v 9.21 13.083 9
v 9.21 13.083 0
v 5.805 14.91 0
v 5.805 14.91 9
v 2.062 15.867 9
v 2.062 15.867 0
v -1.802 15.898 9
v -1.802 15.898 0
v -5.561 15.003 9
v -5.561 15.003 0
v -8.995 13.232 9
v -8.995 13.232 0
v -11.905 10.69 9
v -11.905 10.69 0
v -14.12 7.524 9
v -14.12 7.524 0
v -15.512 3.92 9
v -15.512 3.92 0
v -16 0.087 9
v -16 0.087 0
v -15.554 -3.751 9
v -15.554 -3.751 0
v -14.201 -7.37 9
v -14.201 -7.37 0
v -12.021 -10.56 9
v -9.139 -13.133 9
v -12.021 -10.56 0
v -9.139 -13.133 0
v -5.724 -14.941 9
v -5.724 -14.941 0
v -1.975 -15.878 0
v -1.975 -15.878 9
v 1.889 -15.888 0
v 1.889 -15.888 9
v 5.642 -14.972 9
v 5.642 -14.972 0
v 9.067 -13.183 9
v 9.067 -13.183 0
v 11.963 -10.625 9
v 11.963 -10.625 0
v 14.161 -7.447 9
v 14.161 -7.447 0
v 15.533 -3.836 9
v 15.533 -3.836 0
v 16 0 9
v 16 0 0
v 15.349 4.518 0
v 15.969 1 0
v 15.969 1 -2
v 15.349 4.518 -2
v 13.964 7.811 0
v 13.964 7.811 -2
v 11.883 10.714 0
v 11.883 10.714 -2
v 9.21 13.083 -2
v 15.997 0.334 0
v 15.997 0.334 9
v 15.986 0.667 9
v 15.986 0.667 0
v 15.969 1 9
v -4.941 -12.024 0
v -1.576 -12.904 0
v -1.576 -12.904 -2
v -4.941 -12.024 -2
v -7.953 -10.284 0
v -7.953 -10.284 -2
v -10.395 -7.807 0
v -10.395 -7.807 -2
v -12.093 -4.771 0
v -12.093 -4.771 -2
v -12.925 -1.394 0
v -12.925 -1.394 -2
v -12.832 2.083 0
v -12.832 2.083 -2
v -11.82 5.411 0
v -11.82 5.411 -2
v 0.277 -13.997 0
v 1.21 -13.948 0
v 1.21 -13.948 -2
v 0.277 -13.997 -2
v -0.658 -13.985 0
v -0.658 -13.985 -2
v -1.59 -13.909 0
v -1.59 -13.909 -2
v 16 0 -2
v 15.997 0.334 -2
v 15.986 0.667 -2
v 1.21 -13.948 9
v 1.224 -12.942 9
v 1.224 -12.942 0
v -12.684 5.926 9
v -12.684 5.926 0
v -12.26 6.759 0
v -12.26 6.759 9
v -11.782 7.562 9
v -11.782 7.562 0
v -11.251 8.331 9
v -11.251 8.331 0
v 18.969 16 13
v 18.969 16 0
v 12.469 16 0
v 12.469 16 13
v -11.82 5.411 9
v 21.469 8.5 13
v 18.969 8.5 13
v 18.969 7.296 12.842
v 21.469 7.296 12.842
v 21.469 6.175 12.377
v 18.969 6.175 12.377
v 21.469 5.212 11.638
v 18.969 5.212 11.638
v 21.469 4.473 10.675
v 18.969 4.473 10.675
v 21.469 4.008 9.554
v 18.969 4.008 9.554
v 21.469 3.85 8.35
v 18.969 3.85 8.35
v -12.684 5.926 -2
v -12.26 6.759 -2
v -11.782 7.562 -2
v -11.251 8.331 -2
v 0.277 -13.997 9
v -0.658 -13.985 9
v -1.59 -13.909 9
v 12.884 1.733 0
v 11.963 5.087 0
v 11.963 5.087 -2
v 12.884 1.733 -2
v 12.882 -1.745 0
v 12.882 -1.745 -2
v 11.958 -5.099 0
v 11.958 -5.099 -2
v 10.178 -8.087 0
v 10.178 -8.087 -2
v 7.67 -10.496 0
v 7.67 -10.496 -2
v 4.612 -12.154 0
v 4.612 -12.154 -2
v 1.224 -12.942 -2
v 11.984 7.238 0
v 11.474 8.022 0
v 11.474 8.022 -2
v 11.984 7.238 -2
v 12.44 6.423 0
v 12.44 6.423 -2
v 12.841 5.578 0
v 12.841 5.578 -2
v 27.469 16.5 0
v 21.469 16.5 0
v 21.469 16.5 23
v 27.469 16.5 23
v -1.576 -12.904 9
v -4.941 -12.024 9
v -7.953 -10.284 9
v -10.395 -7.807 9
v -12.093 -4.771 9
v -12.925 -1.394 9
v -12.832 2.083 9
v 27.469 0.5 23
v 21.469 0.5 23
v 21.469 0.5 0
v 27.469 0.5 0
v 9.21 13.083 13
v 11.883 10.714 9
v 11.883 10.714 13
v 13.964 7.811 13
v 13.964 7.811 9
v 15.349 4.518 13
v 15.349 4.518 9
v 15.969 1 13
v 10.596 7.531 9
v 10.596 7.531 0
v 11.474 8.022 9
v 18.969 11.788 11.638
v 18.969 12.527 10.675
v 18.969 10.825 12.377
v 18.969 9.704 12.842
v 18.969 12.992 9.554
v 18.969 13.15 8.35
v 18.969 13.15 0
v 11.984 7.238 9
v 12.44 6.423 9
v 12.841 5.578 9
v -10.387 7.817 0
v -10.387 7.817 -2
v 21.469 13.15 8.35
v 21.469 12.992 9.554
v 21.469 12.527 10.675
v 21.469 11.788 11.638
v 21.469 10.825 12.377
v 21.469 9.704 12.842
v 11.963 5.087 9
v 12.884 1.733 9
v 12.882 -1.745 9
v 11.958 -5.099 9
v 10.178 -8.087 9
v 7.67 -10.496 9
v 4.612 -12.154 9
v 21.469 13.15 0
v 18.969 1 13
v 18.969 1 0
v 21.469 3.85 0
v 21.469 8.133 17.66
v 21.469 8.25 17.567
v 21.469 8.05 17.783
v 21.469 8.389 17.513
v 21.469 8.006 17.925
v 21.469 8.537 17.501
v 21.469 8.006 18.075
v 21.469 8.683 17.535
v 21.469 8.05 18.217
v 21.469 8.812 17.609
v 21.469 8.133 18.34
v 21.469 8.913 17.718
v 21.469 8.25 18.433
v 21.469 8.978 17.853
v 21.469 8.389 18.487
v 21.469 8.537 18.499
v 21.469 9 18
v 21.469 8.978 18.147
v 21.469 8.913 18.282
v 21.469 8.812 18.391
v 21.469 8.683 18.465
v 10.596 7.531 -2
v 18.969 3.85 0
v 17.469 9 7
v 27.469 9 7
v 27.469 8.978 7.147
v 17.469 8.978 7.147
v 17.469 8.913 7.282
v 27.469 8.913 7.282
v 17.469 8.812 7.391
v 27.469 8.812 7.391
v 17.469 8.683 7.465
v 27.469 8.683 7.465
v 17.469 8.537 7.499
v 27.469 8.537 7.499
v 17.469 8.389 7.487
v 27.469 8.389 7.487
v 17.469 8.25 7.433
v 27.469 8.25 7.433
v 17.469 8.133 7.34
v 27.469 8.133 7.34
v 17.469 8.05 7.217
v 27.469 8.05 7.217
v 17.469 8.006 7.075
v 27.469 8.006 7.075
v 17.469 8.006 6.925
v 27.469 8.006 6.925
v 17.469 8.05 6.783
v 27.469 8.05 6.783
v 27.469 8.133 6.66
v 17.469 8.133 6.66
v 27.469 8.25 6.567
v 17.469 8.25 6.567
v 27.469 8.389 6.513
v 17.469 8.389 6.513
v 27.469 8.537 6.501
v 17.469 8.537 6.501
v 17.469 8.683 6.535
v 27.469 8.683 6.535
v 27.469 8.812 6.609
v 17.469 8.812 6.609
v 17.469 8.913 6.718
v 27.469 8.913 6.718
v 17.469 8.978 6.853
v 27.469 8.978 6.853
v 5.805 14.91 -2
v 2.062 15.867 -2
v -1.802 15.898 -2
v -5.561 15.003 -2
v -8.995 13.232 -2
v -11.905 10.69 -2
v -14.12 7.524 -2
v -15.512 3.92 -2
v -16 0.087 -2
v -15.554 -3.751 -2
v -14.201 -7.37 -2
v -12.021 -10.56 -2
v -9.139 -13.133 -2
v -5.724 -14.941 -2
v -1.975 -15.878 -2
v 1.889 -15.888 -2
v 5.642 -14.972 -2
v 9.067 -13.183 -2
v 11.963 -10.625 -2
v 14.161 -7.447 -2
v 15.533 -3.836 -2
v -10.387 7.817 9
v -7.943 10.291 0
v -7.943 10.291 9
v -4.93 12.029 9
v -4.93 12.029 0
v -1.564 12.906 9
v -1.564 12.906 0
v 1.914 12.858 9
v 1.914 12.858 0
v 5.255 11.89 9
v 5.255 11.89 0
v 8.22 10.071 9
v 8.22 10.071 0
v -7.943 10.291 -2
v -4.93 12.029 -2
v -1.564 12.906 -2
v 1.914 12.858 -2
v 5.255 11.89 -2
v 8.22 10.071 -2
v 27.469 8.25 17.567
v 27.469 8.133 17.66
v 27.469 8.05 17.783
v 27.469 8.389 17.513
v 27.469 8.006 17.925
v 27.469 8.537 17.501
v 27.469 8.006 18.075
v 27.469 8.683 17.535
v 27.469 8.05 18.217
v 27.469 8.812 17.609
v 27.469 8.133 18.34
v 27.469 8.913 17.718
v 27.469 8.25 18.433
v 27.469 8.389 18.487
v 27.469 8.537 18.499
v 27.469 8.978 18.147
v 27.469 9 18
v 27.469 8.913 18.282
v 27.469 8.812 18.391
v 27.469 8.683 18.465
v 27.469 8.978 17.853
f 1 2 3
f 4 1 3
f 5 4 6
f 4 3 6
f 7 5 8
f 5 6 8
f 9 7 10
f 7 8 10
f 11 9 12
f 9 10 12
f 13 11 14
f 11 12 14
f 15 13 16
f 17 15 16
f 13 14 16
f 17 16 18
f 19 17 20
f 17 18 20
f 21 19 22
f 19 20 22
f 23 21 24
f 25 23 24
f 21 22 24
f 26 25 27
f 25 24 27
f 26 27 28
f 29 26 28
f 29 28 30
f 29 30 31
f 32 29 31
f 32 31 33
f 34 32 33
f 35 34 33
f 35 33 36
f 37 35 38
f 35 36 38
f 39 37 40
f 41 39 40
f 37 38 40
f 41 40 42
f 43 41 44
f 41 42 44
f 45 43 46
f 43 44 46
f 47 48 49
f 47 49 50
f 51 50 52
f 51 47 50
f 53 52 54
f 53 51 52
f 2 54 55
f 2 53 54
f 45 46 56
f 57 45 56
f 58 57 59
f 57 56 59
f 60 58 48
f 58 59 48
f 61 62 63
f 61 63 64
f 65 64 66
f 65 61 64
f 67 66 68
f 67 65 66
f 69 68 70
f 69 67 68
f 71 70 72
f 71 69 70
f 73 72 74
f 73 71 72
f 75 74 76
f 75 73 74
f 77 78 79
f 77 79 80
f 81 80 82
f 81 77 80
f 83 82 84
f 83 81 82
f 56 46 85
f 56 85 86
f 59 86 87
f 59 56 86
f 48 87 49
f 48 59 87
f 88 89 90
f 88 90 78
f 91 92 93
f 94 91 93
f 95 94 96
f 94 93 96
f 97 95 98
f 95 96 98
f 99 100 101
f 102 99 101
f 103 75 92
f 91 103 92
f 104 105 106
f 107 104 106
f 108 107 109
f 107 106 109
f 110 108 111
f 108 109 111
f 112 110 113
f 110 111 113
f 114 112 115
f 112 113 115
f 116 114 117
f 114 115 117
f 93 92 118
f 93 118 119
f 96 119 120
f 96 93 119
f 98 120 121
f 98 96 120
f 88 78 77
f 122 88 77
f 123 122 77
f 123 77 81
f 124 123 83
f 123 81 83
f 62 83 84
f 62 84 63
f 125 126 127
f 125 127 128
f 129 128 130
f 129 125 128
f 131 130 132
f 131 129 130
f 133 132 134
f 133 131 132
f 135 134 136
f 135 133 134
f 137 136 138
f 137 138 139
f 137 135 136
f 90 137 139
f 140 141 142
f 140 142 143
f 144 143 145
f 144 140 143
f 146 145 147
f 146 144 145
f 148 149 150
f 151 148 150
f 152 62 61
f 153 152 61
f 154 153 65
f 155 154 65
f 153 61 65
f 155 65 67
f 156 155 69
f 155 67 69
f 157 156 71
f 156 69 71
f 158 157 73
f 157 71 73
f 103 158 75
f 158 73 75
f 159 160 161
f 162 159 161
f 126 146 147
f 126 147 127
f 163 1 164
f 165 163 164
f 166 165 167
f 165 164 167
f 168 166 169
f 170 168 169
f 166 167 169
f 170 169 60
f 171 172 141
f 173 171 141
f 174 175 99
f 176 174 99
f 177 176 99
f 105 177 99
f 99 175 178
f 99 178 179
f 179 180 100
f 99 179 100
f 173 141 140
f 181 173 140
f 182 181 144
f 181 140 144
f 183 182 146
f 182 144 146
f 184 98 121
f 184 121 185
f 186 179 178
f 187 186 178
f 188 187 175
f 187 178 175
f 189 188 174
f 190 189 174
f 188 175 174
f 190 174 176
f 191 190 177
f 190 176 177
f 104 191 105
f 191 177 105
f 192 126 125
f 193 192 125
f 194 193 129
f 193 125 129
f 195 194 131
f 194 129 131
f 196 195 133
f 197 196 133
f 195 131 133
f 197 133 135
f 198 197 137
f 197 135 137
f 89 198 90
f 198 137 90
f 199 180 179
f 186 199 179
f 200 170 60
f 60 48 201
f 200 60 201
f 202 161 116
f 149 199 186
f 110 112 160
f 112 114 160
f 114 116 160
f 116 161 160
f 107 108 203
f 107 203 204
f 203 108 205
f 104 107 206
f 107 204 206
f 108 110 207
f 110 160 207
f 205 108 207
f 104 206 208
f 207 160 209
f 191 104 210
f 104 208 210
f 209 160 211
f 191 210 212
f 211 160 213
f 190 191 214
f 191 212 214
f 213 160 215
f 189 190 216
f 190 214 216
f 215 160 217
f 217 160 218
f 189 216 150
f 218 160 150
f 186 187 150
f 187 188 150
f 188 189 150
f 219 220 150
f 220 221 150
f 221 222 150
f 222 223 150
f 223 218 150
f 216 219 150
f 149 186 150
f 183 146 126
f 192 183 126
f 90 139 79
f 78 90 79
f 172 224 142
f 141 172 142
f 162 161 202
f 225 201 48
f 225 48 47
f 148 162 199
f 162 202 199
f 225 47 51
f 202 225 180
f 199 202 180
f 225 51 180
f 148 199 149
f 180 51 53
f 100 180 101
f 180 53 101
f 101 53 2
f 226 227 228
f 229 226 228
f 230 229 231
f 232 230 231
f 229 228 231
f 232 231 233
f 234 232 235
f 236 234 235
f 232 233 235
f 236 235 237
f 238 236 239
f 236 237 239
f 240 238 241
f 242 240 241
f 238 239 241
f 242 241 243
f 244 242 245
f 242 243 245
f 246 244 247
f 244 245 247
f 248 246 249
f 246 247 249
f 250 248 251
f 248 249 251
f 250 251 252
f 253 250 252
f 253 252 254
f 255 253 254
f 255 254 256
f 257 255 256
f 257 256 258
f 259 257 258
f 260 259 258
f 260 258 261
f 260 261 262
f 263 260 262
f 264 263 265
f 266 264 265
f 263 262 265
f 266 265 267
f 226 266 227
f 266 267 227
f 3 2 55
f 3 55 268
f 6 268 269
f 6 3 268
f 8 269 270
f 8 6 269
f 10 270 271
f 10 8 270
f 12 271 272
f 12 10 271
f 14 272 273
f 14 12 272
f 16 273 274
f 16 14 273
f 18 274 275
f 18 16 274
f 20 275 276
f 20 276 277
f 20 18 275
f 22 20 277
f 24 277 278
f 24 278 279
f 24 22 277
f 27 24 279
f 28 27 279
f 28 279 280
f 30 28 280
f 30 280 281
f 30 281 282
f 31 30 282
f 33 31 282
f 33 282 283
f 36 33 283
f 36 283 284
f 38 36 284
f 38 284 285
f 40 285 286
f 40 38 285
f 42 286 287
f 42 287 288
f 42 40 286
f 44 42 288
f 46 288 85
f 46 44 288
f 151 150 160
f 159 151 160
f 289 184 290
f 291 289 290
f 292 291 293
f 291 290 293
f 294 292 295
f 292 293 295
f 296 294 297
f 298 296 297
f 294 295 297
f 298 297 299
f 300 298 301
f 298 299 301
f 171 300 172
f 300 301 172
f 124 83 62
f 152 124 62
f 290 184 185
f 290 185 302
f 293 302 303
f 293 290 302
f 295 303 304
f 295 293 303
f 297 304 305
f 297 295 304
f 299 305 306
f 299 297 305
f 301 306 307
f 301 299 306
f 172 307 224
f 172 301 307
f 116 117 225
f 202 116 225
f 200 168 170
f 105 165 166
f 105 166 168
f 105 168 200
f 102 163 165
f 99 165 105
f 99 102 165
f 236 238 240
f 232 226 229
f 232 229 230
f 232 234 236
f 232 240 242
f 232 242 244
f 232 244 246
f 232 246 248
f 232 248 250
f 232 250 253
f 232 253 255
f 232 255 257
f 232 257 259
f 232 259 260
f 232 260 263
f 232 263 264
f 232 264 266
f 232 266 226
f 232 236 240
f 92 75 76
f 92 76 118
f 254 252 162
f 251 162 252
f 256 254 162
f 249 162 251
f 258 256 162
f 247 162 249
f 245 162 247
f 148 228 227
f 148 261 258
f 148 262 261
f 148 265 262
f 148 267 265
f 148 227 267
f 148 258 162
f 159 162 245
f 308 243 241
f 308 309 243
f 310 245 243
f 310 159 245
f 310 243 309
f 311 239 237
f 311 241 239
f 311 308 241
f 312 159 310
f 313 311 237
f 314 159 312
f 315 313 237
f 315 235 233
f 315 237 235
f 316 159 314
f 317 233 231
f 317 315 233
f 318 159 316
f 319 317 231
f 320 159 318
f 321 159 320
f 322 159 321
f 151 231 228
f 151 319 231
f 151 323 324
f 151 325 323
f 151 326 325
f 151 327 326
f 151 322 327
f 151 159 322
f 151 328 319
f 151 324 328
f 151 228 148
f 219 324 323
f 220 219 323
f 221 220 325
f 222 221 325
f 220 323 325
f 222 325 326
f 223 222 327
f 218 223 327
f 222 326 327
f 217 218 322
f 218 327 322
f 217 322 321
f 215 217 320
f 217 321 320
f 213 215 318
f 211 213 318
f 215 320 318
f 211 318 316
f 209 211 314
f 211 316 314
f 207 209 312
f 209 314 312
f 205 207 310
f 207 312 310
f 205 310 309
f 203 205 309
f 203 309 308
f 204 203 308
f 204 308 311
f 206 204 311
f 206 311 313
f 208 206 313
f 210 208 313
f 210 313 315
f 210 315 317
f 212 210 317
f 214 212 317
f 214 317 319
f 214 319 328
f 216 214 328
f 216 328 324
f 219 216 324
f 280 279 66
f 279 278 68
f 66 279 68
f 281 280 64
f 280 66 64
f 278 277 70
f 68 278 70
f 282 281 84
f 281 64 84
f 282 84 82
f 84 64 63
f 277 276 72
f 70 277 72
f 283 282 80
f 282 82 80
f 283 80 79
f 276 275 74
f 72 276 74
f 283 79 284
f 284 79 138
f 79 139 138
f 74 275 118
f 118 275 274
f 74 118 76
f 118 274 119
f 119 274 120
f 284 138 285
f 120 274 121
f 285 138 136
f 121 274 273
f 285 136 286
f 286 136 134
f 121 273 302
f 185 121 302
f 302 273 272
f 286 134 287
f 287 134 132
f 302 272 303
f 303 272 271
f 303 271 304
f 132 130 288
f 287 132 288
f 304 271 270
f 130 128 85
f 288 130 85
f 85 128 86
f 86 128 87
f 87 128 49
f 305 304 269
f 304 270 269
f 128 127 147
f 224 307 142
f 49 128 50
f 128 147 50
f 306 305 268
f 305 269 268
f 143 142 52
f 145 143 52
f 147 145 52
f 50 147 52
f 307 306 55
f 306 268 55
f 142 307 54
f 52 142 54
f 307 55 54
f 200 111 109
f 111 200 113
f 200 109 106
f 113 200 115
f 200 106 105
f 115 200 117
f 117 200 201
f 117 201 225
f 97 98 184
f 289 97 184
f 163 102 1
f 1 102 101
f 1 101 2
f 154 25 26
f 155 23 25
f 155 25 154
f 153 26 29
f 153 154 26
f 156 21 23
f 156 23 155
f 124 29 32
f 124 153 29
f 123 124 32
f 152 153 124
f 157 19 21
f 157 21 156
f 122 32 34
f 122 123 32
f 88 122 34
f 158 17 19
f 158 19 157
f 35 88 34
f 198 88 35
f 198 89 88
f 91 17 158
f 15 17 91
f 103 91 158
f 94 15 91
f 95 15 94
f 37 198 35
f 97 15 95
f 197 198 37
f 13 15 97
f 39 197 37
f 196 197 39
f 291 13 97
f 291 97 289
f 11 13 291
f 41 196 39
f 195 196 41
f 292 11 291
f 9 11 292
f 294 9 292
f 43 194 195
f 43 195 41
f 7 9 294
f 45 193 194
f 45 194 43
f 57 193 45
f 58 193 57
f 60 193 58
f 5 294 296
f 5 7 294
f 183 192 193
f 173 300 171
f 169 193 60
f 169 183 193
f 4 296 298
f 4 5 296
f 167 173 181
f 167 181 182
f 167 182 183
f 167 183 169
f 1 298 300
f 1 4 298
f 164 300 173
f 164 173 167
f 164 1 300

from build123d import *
from build123d import SkipClean  # not in build123d's __all__

# Parameters (mm, degrees)
F1_DEPTH = 9
F2_DEPTH = 13
F4_DEPTH = 2.5
F6_DEPTH = 6
F7_R     = 0.5
F8_DEPTH = 10
F9_DEPTH = 2


with BuildPart() as f1:
    # F0 (on Top) → F1 (new body)
    with BuildSketch(Plane.XY):
        with BuildLine():
            ThreePointArc((9.210061901, 13.0833772314), (-14.201425816, -7.3701767138), (16, 0))
            ThreePointArc((16, 0), (15.9921779437, 0.5002445588), (15.9687194227, 1))
            ThreePointArc((15.9687194227, 1), (13.964052369, 7.8105852172), (9.210061901, 13.0833772314))
        make_face()
        with BuildLine():
            Line((10.5963823009, 7.5310478775), (11.473873387, 8.0218594789))
            ThreePointArc((11.473873387, 8.0218594789), (12.2185458229, 6.834262065), (12.8407258, 5.5781503143))
            Line((12.8407258, 5.5781503143), (11.9632347139, 5.0873387129))
            ThreePointArc((11.9632347139, 5.0873387129), (11.1687805133, -6.6526943298), (1.2238876286, -12.9422601995))
            Line((1.2238876286, -12.9422601995), (1.2101974008, -13.9475955724))
            ThreePointArc((1.2101974008, -13.9475955724), (-0.190628347, -13.9987021125), (-1.5895430217, -13.909469903))
            Line((-1.5895430217, -13.909469903), (-1.5758527939, -12.9041345301))
            ThreePointArc((-1.5758527939, -12.9041345301), (-11.3457925498, -6.346100489), (-11.8202699295, 5.4112123221))
            Line((-11.8202699295, 5.4112123221), (-12.6840707878, 5.9257360935))
            ThreePointArc((-12.6840707878, 5.9257360935), (-12.0279174759, 7.1644400474), (-11.2511827783, 8.3313195887))
            Line((-11.2511827783, 8.3313195887), (-10.38738192, 7.8167958172))
            ThreePointArc((-10.38738192, 7.8167958172), (0.1770120365, 12.9987948187), (10.5963823009, 7.5310478775))
        make_face(mode=Mode.SUBTRACT)
        with BuildLine():
            ThreePointArc((9.210061901, 13.0833772314), (13.964052369, 7.8105852172), (15.9687194227, 1))
            Line((15.9687194227, 1), (18.9687194227, 1))
            Line((18.9687194227, 1), (18.9687194227, 16))
            Line((18.9687194227, 16), (12.4687194227, 16))
            Line((12.4687194227, 16), (9.210061901, 13.0833772314))
        make_face()
    extrude(amount=F1_DEPTH)

    # F0 (on Top) → F2 (join)
    with BuildSketch(Plane.XY):
        with BuildLine():
            ThreePointArc((9.210061901, 13.0833772314), (13.964052369, 7.8105852172), (15.9687194227, 1))
            Line((15.9687194227, 1), (18.9687194227, 1))
            Line((18.9687194227, 1), (18.9687194227, 16))
            Line((18.9687194227, 16), (12.4687194227, 16))
            Line((12.4687194227, 16), (9.210061901, 13.0833772314))
        make_face()
    extrude(amount=F2_DEPTH)

    # F3 (on face) → F4 (join)
    with BuildSketch(Plane.YZ.offset(18.9687194227)):
        with BuildLine():
            Line((3.85, 8.35), (3.85, 0))
            Line((3.85, 0), (13.15, 0))
            Line((13.15, 0), (13.15, 8.35))
            ThreePointArc((13.15, 8.35), (11.7880465325, 11.6380465325), (8.5, 13))
            ThreePointArc((8.5, 13), (5.2119534675, 11.6380465325), (3.85, 8.35))
        make_face()
    extrude(amount=F4_DEPTH)

    # F5 (on face) → F6 (join)
    with BuildSketch(Plane.YZ.offset(21.4687194227)):
        with BuildLine():
            Line((0.5, 23), (0.5, 0))
            Line((0.5, 0), (3.85, 0))
            Line((3.85, 0), (3.85, 8.35))
            ThreePointArc((3.85, 8.35), (8.5, 13), (13.15, 8.35))
            Line((13.15, 8.35), (13.15, 0))
            Line((13.15, 0), (16.5, 0))
            Line((16.5, 0), (16.5, 23))
            Line((16.5, 23), (0.5, 23))
        make_face()
        with BuildLine():
            Line((3.85, 8.35), (3.85, 0))
            Line((3.85, 0), (13.15, 0))
            Line((13.15, 0), (13.15, 8.35))
            ThreePointArc((13.15, 8.35), (8.5, 13), (3.85, 8.35))
        make_face()
    extrude(amount=F6_DEPTH)

    # F7 (on face) → F8 (cut)
    with BuildSketch(Plane.YZ.offset(27.4687194227)):
        with Locations((8.5, 7)):
            Circle(F7_R)
        with Locations((8.5, 18)):
            Circle(F7_R)
    extrude(amount=-F8_DEPTH, mode=Mode.SUBTRACT)

    # F0 (on Top) → F9 (join)
    with BuildSketch(Plane.XY):
        with BuildLine():
            ThreePointArc((9.210061901, 13.0833772314), (-14.201425816, -7.3701767138), (16, 0))
            ThreePointArc((16, 0), (15.9921779437, 0.5002445588), (15.9687194227, 1))
            ThreePointArc((15.9687194227, 1), (13.964052369, 7.8105852172), (9.210061901, 13.0833772314))
        make_face()
        with BuildLine():
            Line((10.5963823009, 7.5310478775), (11.473873387, 8.0218594789))
            ThreePointArc((11.473873387, 8.0218594789), (12.2185458229, 6.834262065), (12.8407258, 5.5781503143))
            Line((12.8407258, 5.5781503143), (11.9632347139, 5.0873387129))
            ThreePointArc((11.9632347139, 5.0873387129), (11.1687805133, -6.6526943298), (1.2238876286, -12.9422601995))
            Line((1.2238876286, -12.9422601995), (1.2101974008, -13.9475955724))
            ThreePointArc((1.2101974008, -13.9475955724), (-0.190628347, -13.9987021125), (-1.5895430217, -13.909469903))
            Line((-1.5895430217, -13.909469903), (-1.5758527939, -12.9041345301))
            ThreePointArc((-1.5758527939, -12.9041345301), (-11.3457925498, -6.346100489), (-11.8202699295, 5.4112123221))
            Line((-11.8202699295, 5.4112123221), (-12.6840707878, 5.9257360935))
            ThreePointArc((-12.6840707878, 5.9257360935), (-12.0279174759, 7.1644400474), (-11.2511827783, 8.3313195887))
            Line((-11.2511827783, 8.3313195887), (-10.38738192, 7.8167958172))
            ThreePointArc((-10.38738192, 7.8167958172), (0.1770120365, 12.9987948187), (10.5963823009, 7.5310478775))
        make_face(mode=Mode.SUBTRACT)
    with SkipClean():  # cleaning this boolean's faces spoils the solid; the shape is the same uncleaned
        extrude(amount=-F9_DEPTH)


solid = f1.part
